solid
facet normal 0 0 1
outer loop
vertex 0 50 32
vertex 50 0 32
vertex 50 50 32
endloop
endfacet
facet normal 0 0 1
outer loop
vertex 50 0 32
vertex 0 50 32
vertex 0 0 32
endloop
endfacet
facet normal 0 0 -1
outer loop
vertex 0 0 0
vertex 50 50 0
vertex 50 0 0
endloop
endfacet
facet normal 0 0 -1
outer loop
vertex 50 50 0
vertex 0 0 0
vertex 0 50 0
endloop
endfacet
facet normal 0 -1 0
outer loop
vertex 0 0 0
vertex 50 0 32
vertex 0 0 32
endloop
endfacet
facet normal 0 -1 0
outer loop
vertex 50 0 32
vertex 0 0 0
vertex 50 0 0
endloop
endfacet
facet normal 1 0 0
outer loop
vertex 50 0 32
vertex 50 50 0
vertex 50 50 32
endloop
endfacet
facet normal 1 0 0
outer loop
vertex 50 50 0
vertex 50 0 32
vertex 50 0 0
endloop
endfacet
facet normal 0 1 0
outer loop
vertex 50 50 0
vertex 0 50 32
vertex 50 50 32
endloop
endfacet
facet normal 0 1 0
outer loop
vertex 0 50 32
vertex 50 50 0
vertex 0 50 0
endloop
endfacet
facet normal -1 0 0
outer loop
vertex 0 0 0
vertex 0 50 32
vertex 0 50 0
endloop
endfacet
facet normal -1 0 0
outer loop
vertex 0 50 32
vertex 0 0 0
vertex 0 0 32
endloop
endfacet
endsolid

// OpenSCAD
// Pressure-advance tower (Klipper's TUNING_TOWER method): a plain 50 mm square, 32 mm tall, sliced with one wall and
// no infill so each layer is a single fast loop with four sharp corners. Workshop adds
// TUNING_TOWER COMMAND=SET_PRESSURE_ADVANCE PARAMETER=ADVANCE START=0 FACTOR=0.002 to the G-code, so PA = height x 0.002.
// Read the corners under a lamp: the height where they are sharpest, with no bulge and no gap, gives the value.
cube([50, 50, 32]);
